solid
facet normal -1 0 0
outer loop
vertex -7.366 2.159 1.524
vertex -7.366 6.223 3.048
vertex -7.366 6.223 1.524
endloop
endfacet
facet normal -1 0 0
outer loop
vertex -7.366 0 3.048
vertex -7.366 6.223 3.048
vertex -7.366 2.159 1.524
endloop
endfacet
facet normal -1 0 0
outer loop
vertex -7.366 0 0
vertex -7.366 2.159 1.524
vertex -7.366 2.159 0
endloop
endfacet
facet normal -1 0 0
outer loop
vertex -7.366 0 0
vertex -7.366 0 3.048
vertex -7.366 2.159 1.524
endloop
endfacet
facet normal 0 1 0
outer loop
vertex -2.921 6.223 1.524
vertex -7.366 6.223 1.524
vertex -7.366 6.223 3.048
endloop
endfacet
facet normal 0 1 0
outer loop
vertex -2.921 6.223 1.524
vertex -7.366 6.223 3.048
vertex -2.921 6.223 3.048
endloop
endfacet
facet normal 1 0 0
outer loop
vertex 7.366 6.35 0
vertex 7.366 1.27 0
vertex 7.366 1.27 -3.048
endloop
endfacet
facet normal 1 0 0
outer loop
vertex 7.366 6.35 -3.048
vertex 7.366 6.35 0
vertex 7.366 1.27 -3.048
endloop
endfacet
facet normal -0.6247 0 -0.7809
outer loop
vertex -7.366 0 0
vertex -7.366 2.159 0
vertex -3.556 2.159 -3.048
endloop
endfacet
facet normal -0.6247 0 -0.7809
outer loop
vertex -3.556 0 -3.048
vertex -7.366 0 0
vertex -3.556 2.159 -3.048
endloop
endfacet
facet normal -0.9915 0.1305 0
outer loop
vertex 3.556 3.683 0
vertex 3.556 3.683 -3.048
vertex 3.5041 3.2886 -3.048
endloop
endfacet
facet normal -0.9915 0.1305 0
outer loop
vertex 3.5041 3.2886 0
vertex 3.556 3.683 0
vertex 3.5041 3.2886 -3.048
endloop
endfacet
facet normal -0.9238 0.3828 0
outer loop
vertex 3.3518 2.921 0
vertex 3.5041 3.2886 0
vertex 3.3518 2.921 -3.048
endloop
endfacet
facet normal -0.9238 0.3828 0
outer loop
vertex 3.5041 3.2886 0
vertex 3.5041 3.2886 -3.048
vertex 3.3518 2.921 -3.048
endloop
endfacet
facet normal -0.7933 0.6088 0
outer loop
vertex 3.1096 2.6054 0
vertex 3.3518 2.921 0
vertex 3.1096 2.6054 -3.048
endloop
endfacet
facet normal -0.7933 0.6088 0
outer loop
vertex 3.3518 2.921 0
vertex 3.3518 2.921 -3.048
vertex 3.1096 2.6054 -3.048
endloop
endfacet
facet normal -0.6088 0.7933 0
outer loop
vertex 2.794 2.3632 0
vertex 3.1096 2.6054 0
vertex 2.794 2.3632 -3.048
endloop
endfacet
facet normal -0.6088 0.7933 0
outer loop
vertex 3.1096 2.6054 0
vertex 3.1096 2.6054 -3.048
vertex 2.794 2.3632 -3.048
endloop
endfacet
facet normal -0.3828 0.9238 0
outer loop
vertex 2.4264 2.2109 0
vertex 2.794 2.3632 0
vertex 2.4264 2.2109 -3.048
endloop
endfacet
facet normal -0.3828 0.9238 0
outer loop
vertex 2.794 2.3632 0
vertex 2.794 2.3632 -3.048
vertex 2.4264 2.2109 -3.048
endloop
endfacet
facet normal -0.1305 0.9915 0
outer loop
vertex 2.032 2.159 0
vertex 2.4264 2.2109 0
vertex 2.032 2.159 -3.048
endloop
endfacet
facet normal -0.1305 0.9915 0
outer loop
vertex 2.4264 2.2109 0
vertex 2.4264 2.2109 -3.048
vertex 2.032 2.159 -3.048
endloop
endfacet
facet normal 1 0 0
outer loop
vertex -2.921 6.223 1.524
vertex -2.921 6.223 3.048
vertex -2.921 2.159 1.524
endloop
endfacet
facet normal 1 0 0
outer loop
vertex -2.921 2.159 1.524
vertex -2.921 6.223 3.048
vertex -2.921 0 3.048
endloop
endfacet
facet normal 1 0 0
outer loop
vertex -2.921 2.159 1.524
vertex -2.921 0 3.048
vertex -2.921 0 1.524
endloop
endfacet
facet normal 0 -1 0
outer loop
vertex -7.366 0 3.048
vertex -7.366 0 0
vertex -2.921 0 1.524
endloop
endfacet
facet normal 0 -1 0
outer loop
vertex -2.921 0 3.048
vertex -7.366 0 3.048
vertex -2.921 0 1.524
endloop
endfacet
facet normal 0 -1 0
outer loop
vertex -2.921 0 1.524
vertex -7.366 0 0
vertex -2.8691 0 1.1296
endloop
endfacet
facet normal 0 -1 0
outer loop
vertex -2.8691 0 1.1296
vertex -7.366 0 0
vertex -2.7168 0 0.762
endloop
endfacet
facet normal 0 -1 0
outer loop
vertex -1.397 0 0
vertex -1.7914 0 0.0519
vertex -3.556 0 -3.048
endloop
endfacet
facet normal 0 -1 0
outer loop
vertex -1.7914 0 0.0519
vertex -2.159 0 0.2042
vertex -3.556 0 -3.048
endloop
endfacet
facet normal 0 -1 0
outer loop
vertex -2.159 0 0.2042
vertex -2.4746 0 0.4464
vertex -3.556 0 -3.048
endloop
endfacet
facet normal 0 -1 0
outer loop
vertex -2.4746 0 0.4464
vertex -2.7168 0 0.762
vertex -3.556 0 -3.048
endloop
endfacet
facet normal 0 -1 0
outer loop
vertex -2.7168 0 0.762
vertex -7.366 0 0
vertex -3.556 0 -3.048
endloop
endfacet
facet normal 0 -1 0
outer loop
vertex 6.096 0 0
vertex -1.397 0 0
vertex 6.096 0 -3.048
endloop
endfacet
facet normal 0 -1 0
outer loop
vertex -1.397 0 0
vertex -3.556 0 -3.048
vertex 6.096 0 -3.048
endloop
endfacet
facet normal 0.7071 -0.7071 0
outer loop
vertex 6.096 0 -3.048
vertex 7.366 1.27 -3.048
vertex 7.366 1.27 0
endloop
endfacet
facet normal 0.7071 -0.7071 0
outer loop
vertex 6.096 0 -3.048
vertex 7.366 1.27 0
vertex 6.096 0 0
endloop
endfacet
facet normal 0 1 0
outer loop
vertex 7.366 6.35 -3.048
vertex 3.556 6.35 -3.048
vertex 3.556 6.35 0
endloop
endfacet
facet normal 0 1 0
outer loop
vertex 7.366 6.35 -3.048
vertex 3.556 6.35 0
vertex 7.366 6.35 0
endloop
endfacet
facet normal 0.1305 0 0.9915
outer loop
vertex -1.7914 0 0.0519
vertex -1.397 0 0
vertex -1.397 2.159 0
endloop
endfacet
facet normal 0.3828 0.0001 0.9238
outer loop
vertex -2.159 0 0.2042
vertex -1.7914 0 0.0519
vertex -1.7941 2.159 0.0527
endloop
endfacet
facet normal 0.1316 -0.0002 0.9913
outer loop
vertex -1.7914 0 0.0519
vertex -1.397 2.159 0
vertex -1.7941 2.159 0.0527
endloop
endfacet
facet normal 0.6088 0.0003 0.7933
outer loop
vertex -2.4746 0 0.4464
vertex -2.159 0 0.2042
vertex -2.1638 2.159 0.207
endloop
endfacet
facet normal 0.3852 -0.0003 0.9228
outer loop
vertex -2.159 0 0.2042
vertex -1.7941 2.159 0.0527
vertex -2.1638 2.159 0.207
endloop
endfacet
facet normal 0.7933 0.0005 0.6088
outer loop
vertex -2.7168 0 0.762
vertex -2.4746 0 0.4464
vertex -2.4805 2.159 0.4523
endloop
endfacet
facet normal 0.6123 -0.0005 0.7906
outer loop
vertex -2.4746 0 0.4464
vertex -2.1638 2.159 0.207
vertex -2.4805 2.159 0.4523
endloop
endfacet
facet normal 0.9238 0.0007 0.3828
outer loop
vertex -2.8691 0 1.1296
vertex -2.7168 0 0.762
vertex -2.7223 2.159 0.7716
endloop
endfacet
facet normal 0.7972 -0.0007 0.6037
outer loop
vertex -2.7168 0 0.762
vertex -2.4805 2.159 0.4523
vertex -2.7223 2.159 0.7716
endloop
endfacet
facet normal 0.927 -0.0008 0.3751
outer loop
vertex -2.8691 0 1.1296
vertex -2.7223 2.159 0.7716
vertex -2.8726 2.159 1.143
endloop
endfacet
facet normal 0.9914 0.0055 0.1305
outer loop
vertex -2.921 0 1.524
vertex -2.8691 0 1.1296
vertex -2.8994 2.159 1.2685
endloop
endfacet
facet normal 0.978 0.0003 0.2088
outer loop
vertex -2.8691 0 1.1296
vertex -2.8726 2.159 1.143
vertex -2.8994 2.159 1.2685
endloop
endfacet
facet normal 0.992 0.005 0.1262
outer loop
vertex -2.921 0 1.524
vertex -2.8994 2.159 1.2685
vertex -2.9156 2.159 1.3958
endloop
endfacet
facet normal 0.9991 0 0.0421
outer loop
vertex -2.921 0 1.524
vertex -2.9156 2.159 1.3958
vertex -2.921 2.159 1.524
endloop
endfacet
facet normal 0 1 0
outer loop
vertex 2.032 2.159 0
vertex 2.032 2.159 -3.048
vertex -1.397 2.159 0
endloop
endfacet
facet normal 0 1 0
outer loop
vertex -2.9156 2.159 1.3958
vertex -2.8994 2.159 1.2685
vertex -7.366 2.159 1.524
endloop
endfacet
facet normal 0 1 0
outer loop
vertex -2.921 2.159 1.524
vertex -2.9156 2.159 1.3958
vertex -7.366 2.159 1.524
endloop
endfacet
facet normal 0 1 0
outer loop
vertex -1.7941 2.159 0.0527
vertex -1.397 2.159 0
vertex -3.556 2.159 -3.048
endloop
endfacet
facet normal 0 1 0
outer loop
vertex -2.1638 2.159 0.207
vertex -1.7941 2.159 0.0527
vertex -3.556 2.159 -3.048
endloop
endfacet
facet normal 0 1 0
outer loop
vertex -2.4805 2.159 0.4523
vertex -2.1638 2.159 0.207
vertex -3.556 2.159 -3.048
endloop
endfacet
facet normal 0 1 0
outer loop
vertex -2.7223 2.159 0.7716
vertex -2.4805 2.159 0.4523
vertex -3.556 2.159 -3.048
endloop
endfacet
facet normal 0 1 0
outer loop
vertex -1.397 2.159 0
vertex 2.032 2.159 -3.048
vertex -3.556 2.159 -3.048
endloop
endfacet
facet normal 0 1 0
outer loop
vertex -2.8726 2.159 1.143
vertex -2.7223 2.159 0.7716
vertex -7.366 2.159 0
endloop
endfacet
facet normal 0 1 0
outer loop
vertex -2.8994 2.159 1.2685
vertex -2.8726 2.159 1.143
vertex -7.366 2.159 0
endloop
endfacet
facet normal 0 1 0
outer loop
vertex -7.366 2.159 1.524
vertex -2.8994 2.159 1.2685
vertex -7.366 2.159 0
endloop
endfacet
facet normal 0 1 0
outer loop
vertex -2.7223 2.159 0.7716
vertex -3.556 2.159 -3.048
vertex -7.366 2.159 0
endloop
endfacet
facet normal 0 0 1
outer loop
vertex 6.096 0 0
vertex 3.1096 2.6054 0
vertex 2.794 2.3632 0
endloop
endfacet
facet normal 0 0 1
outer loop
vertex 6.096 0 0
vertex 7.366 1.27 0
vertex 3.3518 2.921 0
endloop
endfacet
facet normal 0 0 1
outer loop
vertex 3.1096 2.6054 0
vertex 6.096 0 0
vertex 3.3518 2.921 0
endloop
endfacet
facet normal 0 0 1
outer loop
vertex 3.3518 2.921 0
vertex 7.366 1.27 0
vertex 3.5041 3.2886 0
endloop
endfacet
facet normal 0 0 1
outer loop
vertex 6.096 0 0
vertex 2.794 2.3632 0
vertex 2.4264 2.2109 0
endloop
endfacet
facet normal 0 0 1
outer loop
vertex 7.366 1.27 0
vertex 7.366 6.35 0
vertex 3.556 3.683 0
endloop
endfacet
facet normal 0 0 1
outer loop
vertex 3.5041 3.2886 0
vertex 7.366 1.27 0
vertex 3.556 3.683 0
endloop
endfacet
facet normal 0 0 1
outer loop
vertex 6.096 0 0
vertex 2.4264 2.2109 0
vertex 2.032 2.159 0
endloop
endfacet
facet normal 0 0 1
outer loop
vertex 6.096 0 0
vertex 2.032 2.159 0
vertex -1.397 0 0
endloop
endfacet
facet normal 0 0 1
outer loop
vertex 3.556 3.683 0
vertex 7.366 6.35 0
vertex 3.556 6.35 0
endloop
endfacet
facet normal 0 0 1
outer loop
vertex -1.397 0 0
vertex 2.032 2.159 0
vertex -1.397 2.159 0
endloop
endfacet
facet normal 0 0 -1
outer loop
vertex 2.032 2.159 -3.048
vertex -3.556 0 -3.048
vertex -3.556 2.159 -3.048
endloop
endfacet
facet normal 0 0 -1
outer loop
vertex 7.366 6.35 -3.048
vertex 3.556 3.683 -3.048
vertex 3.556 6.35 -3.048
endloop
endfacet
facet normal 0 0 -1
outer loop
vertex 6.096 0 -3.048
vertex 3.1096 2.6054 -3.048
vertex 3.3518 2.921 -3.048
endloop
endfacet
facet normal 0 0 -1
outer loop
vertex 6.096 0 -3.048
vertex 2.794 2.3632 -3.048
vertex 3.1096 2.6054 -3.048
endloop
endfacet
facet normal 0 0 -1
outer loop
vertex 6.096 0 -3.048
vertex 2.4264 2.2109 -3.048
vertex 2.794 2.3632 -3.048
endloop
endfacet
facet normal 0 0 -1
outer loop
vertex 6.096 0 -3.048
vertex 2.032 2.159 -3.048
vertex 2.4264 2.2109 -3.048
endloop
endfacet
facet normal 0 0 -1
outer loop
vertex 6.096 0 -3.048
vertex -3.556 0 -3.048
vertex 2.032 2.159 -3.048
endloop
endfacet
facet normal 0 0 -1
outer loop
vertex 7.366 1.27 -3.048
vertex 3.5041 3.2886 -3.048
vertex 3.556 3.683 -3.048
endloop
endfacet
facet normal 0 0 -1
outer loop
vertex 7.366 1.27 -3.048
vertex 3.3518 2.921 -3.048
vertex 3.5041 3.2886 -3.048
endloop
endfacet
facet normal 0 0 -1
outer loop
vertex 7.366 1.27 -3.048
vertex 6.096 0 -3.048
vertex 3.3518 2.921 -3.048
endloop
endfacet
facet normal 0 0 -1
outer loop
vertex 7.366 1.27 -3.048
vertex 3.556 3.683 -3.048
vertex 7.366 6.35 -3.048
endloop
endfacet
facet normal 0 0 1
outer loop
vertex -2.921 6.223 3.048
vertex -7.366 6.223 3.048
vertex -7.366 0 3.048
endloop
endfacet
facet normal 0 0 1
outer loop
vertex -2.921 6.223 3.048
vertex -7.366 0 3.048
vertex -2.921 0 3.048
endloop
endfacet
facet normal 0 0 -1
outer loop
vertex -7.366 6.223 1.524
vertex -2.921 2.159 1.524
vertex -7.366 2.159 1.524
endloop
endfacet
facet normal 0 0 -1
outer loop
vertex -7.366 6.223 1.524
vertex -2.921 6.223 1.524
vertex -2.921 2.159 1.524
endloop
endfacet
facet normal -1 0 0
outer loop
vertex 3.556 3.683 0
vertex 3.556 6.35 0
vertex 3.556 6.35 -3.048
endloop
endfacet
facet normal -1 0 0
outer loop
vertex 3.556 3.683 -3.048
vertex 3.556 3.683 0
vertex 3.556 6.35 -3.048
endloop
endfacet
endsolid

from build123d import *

# Parameters (mm, degrees)
SKETCH1_W           = 14.732
SKETCH1_H           = 6.096
BOSS_EXTRUDE1_DEPTH = 6.35
CUT_EXTRUDE2_DEPTH  = 7.35
SKETCH3_W           = 10.922
SKETCH3_H           = 6.096
CUT_EXTRUDE1_DEPTH  = 2.667
CUT_EXTRUDE3_DEPTH  = 4.683
SKETCH9_W           = 4.445
SKETCH9_H           = 1.524
BOSS_EXTRUDE2_DEPTH = 2.54
CUT_EXTRUDE4_DEPTH  = 7.096
CUT_EXTRUDE5_DEPTH  = 4.191
SKETCH15_W          = 0.048393345
SKETCH15_H          = 1.524
CUT_EXTRUDE10_DEPTH = 2.905
SKETCH13_W          = 4.445
SKETCH13_H          = 1.524
CUT_EXTRUDE11_DEPTH = 4.572


with BuildPart() as part:
    # Sketch1 → Boss-Extrude1 (new body)
    with BuildSketch(Plane(origin=(0, 0, 0), x_dir=(1, 0, 0), z_dir=(0, 1, 0))):
        Rectangle(SKETCH1_W, SKETCH1_H)
    extrude(amount=BOSS_EXTRUDE1_DEPTH)

    # Sketch4 → Cut-Extrude2 (cut, through all)
    with BuildSketch(Plane(origin=(0, 6.35, 0), x_dir=(1, 0, 0), z_dir=(0, 1, 0))):
        with BuildLine():
            Line((7.366, 0), (-1.397, 0))
            ThreePointArc((-1.397, 0), (-0.319369265, -0.446369265), (0.127, -1.524))
            ThreePointArc((0.127, -1.524), (-0.319369265, -2.601630735), (-1.397, -3.048))
            Line((-1.397, -3.048), (7.366, -3.048))
            Line((7.366, -3.048), (7.366, 0))
        make_face()
        with BuildLine():
            ThreePointArc((0.127, -1.524), (-0.319369265, -0.446369265), (-1.397, 0))
            Line((-1.397, 0), (-1.397, -3.048))
            ThreePointArc((-1.397, -3.048), (-0.319369265, -2.601630735), (0.127, -1.524))
        make_face()
        with BuildLine():
            Line((-1.397, -3.048), (-1.397, 0))
            ThreePointArc((-1.397, 0), (-2.474630735, -0.446369265), (-2.921, -1.524))
            ThreePointArc((-2.921, -1.524), (-2.474630735, -2.601630735), (-1.397, -3.048))
        make_face()
        with BuildLine():
            ThreePointArc((-1.397, -3.048), (-2.474630735, -2.601630735), (-2.921, -1.524))
            Line((-2.921, -1.524), (-2.921, -3.048))
            Line((-2.921, -3.048), (-1.397, -3.048))
        make_face()
    extrude(amount=-CUT_EXTRUDE2_DEPTH, mode=Mode.SUBTRACT)

    # Sketch3 → Cut-Extrude1 (cut)
    with BuildSketch(Plane(origin=(0, 6.35, 0), x_dir=(1, 0, 0), z_dir=(0, 1, 0))):
        with Locations((-1.905, 0)):
            Rectangle(SKETCH3_W, SKETCH3_H)
    extrude(amount=-CUT_EXTRUDE1_DEPTH, mode=Mode.SUBTRACT)

    # Sketch8 → Cut-Extrude3 (cut, through all)
    with BuildSketch(Plane(origin=(0, 3.683, 0), x_dir=(1, 0, 0), z_dir=(0, 1, 0))):
        Polygon((-7.366, 0), (-3.556, 3.048), (-7.366, 3.048), align=None)
    extrude(amount=-CUT_EXTRUDE3_DEPTH, mode=Mode.SUBTRACT)

    # Sketch9 → Boss-Extrude2 (add)
    with BuildSketch(Plane(origin=(0, 3.683, 0), x_dir=(1, 0, 0), z_dir=(0, 1, 0))):
        with Locations((-5.1435, -2.286)):
            Rectangle(SKETCH9_W, SKETCH9_H)
    extrude(amount=BOSS_EXTRUDE2_DEPTH)

    # Sketch10 → Cut-Extrude4 (cut, through all)
    with BuildSketch(Plane(origin=(0, 0, -3.048), x_dir=(-1, 0, 0), z_dir=(0, 0, -1))):
        Polygon((-7.366, 1.27), (-6.096, 0), (-7.366, 0), align=None)
    extrude(amount=-CUT_EXTRUDE4_DEPTH, mode=Mode.SUBTRACT)

    # Sketch12 → Cut-Extrude5 (cut)
    with BuildSketch(Plane(origin=(0, 0, -3.048), x_dir=(-1, 0, 0), z_dir=(0, 0, -1))):
        with BuildLine():
            ThreePointArc((-3.556, 3.683), (-3.109630735, 2.605369265), (-2.032, 2.159))
            Line((-2.032, 2.159), (2.921, 2.159))
            Line((2.921, 2.159), (2.921, 3.683))
            Line((2.921, 3.683), (-3.556, 3.683))
        make_face()
    extrude(amount=-CUT_EXTRUDE5_DEPTH, mode=Mode.SUBTRACT)

    # Sketch15 → Cut-Extrude10 (cut, through all)
    with BuildSketch(Plane(origin=(0, 0, 1.143), x_dir=(-1, 0, 0), z_dir=(0, 0, -1))):
        with Locations((2.896803328, 2.921)):
            Rectangle(SKETCH15_W, SKETCH15_H)
    extrude(amount=-CUT_EXTRUDE10_DEPTH, mode=Mode.SUBTRACT)

    # Sketch13 → Cut-Extrude11 (cut)
    with BuildSketch(Plane(origin=(0, 0, -3.048), x_dir=(-1, 0, 0), z_dir=(0, 0, -1))):
        with Locations((5.1435, 2.921)):
            Rectangle(SKETCH13_W, SKETCH13_H)
    extrude(amount=-CUT_EXTRUDE11_DEPTH, mode=Mode.SUBTRACT)


solid = part.part
